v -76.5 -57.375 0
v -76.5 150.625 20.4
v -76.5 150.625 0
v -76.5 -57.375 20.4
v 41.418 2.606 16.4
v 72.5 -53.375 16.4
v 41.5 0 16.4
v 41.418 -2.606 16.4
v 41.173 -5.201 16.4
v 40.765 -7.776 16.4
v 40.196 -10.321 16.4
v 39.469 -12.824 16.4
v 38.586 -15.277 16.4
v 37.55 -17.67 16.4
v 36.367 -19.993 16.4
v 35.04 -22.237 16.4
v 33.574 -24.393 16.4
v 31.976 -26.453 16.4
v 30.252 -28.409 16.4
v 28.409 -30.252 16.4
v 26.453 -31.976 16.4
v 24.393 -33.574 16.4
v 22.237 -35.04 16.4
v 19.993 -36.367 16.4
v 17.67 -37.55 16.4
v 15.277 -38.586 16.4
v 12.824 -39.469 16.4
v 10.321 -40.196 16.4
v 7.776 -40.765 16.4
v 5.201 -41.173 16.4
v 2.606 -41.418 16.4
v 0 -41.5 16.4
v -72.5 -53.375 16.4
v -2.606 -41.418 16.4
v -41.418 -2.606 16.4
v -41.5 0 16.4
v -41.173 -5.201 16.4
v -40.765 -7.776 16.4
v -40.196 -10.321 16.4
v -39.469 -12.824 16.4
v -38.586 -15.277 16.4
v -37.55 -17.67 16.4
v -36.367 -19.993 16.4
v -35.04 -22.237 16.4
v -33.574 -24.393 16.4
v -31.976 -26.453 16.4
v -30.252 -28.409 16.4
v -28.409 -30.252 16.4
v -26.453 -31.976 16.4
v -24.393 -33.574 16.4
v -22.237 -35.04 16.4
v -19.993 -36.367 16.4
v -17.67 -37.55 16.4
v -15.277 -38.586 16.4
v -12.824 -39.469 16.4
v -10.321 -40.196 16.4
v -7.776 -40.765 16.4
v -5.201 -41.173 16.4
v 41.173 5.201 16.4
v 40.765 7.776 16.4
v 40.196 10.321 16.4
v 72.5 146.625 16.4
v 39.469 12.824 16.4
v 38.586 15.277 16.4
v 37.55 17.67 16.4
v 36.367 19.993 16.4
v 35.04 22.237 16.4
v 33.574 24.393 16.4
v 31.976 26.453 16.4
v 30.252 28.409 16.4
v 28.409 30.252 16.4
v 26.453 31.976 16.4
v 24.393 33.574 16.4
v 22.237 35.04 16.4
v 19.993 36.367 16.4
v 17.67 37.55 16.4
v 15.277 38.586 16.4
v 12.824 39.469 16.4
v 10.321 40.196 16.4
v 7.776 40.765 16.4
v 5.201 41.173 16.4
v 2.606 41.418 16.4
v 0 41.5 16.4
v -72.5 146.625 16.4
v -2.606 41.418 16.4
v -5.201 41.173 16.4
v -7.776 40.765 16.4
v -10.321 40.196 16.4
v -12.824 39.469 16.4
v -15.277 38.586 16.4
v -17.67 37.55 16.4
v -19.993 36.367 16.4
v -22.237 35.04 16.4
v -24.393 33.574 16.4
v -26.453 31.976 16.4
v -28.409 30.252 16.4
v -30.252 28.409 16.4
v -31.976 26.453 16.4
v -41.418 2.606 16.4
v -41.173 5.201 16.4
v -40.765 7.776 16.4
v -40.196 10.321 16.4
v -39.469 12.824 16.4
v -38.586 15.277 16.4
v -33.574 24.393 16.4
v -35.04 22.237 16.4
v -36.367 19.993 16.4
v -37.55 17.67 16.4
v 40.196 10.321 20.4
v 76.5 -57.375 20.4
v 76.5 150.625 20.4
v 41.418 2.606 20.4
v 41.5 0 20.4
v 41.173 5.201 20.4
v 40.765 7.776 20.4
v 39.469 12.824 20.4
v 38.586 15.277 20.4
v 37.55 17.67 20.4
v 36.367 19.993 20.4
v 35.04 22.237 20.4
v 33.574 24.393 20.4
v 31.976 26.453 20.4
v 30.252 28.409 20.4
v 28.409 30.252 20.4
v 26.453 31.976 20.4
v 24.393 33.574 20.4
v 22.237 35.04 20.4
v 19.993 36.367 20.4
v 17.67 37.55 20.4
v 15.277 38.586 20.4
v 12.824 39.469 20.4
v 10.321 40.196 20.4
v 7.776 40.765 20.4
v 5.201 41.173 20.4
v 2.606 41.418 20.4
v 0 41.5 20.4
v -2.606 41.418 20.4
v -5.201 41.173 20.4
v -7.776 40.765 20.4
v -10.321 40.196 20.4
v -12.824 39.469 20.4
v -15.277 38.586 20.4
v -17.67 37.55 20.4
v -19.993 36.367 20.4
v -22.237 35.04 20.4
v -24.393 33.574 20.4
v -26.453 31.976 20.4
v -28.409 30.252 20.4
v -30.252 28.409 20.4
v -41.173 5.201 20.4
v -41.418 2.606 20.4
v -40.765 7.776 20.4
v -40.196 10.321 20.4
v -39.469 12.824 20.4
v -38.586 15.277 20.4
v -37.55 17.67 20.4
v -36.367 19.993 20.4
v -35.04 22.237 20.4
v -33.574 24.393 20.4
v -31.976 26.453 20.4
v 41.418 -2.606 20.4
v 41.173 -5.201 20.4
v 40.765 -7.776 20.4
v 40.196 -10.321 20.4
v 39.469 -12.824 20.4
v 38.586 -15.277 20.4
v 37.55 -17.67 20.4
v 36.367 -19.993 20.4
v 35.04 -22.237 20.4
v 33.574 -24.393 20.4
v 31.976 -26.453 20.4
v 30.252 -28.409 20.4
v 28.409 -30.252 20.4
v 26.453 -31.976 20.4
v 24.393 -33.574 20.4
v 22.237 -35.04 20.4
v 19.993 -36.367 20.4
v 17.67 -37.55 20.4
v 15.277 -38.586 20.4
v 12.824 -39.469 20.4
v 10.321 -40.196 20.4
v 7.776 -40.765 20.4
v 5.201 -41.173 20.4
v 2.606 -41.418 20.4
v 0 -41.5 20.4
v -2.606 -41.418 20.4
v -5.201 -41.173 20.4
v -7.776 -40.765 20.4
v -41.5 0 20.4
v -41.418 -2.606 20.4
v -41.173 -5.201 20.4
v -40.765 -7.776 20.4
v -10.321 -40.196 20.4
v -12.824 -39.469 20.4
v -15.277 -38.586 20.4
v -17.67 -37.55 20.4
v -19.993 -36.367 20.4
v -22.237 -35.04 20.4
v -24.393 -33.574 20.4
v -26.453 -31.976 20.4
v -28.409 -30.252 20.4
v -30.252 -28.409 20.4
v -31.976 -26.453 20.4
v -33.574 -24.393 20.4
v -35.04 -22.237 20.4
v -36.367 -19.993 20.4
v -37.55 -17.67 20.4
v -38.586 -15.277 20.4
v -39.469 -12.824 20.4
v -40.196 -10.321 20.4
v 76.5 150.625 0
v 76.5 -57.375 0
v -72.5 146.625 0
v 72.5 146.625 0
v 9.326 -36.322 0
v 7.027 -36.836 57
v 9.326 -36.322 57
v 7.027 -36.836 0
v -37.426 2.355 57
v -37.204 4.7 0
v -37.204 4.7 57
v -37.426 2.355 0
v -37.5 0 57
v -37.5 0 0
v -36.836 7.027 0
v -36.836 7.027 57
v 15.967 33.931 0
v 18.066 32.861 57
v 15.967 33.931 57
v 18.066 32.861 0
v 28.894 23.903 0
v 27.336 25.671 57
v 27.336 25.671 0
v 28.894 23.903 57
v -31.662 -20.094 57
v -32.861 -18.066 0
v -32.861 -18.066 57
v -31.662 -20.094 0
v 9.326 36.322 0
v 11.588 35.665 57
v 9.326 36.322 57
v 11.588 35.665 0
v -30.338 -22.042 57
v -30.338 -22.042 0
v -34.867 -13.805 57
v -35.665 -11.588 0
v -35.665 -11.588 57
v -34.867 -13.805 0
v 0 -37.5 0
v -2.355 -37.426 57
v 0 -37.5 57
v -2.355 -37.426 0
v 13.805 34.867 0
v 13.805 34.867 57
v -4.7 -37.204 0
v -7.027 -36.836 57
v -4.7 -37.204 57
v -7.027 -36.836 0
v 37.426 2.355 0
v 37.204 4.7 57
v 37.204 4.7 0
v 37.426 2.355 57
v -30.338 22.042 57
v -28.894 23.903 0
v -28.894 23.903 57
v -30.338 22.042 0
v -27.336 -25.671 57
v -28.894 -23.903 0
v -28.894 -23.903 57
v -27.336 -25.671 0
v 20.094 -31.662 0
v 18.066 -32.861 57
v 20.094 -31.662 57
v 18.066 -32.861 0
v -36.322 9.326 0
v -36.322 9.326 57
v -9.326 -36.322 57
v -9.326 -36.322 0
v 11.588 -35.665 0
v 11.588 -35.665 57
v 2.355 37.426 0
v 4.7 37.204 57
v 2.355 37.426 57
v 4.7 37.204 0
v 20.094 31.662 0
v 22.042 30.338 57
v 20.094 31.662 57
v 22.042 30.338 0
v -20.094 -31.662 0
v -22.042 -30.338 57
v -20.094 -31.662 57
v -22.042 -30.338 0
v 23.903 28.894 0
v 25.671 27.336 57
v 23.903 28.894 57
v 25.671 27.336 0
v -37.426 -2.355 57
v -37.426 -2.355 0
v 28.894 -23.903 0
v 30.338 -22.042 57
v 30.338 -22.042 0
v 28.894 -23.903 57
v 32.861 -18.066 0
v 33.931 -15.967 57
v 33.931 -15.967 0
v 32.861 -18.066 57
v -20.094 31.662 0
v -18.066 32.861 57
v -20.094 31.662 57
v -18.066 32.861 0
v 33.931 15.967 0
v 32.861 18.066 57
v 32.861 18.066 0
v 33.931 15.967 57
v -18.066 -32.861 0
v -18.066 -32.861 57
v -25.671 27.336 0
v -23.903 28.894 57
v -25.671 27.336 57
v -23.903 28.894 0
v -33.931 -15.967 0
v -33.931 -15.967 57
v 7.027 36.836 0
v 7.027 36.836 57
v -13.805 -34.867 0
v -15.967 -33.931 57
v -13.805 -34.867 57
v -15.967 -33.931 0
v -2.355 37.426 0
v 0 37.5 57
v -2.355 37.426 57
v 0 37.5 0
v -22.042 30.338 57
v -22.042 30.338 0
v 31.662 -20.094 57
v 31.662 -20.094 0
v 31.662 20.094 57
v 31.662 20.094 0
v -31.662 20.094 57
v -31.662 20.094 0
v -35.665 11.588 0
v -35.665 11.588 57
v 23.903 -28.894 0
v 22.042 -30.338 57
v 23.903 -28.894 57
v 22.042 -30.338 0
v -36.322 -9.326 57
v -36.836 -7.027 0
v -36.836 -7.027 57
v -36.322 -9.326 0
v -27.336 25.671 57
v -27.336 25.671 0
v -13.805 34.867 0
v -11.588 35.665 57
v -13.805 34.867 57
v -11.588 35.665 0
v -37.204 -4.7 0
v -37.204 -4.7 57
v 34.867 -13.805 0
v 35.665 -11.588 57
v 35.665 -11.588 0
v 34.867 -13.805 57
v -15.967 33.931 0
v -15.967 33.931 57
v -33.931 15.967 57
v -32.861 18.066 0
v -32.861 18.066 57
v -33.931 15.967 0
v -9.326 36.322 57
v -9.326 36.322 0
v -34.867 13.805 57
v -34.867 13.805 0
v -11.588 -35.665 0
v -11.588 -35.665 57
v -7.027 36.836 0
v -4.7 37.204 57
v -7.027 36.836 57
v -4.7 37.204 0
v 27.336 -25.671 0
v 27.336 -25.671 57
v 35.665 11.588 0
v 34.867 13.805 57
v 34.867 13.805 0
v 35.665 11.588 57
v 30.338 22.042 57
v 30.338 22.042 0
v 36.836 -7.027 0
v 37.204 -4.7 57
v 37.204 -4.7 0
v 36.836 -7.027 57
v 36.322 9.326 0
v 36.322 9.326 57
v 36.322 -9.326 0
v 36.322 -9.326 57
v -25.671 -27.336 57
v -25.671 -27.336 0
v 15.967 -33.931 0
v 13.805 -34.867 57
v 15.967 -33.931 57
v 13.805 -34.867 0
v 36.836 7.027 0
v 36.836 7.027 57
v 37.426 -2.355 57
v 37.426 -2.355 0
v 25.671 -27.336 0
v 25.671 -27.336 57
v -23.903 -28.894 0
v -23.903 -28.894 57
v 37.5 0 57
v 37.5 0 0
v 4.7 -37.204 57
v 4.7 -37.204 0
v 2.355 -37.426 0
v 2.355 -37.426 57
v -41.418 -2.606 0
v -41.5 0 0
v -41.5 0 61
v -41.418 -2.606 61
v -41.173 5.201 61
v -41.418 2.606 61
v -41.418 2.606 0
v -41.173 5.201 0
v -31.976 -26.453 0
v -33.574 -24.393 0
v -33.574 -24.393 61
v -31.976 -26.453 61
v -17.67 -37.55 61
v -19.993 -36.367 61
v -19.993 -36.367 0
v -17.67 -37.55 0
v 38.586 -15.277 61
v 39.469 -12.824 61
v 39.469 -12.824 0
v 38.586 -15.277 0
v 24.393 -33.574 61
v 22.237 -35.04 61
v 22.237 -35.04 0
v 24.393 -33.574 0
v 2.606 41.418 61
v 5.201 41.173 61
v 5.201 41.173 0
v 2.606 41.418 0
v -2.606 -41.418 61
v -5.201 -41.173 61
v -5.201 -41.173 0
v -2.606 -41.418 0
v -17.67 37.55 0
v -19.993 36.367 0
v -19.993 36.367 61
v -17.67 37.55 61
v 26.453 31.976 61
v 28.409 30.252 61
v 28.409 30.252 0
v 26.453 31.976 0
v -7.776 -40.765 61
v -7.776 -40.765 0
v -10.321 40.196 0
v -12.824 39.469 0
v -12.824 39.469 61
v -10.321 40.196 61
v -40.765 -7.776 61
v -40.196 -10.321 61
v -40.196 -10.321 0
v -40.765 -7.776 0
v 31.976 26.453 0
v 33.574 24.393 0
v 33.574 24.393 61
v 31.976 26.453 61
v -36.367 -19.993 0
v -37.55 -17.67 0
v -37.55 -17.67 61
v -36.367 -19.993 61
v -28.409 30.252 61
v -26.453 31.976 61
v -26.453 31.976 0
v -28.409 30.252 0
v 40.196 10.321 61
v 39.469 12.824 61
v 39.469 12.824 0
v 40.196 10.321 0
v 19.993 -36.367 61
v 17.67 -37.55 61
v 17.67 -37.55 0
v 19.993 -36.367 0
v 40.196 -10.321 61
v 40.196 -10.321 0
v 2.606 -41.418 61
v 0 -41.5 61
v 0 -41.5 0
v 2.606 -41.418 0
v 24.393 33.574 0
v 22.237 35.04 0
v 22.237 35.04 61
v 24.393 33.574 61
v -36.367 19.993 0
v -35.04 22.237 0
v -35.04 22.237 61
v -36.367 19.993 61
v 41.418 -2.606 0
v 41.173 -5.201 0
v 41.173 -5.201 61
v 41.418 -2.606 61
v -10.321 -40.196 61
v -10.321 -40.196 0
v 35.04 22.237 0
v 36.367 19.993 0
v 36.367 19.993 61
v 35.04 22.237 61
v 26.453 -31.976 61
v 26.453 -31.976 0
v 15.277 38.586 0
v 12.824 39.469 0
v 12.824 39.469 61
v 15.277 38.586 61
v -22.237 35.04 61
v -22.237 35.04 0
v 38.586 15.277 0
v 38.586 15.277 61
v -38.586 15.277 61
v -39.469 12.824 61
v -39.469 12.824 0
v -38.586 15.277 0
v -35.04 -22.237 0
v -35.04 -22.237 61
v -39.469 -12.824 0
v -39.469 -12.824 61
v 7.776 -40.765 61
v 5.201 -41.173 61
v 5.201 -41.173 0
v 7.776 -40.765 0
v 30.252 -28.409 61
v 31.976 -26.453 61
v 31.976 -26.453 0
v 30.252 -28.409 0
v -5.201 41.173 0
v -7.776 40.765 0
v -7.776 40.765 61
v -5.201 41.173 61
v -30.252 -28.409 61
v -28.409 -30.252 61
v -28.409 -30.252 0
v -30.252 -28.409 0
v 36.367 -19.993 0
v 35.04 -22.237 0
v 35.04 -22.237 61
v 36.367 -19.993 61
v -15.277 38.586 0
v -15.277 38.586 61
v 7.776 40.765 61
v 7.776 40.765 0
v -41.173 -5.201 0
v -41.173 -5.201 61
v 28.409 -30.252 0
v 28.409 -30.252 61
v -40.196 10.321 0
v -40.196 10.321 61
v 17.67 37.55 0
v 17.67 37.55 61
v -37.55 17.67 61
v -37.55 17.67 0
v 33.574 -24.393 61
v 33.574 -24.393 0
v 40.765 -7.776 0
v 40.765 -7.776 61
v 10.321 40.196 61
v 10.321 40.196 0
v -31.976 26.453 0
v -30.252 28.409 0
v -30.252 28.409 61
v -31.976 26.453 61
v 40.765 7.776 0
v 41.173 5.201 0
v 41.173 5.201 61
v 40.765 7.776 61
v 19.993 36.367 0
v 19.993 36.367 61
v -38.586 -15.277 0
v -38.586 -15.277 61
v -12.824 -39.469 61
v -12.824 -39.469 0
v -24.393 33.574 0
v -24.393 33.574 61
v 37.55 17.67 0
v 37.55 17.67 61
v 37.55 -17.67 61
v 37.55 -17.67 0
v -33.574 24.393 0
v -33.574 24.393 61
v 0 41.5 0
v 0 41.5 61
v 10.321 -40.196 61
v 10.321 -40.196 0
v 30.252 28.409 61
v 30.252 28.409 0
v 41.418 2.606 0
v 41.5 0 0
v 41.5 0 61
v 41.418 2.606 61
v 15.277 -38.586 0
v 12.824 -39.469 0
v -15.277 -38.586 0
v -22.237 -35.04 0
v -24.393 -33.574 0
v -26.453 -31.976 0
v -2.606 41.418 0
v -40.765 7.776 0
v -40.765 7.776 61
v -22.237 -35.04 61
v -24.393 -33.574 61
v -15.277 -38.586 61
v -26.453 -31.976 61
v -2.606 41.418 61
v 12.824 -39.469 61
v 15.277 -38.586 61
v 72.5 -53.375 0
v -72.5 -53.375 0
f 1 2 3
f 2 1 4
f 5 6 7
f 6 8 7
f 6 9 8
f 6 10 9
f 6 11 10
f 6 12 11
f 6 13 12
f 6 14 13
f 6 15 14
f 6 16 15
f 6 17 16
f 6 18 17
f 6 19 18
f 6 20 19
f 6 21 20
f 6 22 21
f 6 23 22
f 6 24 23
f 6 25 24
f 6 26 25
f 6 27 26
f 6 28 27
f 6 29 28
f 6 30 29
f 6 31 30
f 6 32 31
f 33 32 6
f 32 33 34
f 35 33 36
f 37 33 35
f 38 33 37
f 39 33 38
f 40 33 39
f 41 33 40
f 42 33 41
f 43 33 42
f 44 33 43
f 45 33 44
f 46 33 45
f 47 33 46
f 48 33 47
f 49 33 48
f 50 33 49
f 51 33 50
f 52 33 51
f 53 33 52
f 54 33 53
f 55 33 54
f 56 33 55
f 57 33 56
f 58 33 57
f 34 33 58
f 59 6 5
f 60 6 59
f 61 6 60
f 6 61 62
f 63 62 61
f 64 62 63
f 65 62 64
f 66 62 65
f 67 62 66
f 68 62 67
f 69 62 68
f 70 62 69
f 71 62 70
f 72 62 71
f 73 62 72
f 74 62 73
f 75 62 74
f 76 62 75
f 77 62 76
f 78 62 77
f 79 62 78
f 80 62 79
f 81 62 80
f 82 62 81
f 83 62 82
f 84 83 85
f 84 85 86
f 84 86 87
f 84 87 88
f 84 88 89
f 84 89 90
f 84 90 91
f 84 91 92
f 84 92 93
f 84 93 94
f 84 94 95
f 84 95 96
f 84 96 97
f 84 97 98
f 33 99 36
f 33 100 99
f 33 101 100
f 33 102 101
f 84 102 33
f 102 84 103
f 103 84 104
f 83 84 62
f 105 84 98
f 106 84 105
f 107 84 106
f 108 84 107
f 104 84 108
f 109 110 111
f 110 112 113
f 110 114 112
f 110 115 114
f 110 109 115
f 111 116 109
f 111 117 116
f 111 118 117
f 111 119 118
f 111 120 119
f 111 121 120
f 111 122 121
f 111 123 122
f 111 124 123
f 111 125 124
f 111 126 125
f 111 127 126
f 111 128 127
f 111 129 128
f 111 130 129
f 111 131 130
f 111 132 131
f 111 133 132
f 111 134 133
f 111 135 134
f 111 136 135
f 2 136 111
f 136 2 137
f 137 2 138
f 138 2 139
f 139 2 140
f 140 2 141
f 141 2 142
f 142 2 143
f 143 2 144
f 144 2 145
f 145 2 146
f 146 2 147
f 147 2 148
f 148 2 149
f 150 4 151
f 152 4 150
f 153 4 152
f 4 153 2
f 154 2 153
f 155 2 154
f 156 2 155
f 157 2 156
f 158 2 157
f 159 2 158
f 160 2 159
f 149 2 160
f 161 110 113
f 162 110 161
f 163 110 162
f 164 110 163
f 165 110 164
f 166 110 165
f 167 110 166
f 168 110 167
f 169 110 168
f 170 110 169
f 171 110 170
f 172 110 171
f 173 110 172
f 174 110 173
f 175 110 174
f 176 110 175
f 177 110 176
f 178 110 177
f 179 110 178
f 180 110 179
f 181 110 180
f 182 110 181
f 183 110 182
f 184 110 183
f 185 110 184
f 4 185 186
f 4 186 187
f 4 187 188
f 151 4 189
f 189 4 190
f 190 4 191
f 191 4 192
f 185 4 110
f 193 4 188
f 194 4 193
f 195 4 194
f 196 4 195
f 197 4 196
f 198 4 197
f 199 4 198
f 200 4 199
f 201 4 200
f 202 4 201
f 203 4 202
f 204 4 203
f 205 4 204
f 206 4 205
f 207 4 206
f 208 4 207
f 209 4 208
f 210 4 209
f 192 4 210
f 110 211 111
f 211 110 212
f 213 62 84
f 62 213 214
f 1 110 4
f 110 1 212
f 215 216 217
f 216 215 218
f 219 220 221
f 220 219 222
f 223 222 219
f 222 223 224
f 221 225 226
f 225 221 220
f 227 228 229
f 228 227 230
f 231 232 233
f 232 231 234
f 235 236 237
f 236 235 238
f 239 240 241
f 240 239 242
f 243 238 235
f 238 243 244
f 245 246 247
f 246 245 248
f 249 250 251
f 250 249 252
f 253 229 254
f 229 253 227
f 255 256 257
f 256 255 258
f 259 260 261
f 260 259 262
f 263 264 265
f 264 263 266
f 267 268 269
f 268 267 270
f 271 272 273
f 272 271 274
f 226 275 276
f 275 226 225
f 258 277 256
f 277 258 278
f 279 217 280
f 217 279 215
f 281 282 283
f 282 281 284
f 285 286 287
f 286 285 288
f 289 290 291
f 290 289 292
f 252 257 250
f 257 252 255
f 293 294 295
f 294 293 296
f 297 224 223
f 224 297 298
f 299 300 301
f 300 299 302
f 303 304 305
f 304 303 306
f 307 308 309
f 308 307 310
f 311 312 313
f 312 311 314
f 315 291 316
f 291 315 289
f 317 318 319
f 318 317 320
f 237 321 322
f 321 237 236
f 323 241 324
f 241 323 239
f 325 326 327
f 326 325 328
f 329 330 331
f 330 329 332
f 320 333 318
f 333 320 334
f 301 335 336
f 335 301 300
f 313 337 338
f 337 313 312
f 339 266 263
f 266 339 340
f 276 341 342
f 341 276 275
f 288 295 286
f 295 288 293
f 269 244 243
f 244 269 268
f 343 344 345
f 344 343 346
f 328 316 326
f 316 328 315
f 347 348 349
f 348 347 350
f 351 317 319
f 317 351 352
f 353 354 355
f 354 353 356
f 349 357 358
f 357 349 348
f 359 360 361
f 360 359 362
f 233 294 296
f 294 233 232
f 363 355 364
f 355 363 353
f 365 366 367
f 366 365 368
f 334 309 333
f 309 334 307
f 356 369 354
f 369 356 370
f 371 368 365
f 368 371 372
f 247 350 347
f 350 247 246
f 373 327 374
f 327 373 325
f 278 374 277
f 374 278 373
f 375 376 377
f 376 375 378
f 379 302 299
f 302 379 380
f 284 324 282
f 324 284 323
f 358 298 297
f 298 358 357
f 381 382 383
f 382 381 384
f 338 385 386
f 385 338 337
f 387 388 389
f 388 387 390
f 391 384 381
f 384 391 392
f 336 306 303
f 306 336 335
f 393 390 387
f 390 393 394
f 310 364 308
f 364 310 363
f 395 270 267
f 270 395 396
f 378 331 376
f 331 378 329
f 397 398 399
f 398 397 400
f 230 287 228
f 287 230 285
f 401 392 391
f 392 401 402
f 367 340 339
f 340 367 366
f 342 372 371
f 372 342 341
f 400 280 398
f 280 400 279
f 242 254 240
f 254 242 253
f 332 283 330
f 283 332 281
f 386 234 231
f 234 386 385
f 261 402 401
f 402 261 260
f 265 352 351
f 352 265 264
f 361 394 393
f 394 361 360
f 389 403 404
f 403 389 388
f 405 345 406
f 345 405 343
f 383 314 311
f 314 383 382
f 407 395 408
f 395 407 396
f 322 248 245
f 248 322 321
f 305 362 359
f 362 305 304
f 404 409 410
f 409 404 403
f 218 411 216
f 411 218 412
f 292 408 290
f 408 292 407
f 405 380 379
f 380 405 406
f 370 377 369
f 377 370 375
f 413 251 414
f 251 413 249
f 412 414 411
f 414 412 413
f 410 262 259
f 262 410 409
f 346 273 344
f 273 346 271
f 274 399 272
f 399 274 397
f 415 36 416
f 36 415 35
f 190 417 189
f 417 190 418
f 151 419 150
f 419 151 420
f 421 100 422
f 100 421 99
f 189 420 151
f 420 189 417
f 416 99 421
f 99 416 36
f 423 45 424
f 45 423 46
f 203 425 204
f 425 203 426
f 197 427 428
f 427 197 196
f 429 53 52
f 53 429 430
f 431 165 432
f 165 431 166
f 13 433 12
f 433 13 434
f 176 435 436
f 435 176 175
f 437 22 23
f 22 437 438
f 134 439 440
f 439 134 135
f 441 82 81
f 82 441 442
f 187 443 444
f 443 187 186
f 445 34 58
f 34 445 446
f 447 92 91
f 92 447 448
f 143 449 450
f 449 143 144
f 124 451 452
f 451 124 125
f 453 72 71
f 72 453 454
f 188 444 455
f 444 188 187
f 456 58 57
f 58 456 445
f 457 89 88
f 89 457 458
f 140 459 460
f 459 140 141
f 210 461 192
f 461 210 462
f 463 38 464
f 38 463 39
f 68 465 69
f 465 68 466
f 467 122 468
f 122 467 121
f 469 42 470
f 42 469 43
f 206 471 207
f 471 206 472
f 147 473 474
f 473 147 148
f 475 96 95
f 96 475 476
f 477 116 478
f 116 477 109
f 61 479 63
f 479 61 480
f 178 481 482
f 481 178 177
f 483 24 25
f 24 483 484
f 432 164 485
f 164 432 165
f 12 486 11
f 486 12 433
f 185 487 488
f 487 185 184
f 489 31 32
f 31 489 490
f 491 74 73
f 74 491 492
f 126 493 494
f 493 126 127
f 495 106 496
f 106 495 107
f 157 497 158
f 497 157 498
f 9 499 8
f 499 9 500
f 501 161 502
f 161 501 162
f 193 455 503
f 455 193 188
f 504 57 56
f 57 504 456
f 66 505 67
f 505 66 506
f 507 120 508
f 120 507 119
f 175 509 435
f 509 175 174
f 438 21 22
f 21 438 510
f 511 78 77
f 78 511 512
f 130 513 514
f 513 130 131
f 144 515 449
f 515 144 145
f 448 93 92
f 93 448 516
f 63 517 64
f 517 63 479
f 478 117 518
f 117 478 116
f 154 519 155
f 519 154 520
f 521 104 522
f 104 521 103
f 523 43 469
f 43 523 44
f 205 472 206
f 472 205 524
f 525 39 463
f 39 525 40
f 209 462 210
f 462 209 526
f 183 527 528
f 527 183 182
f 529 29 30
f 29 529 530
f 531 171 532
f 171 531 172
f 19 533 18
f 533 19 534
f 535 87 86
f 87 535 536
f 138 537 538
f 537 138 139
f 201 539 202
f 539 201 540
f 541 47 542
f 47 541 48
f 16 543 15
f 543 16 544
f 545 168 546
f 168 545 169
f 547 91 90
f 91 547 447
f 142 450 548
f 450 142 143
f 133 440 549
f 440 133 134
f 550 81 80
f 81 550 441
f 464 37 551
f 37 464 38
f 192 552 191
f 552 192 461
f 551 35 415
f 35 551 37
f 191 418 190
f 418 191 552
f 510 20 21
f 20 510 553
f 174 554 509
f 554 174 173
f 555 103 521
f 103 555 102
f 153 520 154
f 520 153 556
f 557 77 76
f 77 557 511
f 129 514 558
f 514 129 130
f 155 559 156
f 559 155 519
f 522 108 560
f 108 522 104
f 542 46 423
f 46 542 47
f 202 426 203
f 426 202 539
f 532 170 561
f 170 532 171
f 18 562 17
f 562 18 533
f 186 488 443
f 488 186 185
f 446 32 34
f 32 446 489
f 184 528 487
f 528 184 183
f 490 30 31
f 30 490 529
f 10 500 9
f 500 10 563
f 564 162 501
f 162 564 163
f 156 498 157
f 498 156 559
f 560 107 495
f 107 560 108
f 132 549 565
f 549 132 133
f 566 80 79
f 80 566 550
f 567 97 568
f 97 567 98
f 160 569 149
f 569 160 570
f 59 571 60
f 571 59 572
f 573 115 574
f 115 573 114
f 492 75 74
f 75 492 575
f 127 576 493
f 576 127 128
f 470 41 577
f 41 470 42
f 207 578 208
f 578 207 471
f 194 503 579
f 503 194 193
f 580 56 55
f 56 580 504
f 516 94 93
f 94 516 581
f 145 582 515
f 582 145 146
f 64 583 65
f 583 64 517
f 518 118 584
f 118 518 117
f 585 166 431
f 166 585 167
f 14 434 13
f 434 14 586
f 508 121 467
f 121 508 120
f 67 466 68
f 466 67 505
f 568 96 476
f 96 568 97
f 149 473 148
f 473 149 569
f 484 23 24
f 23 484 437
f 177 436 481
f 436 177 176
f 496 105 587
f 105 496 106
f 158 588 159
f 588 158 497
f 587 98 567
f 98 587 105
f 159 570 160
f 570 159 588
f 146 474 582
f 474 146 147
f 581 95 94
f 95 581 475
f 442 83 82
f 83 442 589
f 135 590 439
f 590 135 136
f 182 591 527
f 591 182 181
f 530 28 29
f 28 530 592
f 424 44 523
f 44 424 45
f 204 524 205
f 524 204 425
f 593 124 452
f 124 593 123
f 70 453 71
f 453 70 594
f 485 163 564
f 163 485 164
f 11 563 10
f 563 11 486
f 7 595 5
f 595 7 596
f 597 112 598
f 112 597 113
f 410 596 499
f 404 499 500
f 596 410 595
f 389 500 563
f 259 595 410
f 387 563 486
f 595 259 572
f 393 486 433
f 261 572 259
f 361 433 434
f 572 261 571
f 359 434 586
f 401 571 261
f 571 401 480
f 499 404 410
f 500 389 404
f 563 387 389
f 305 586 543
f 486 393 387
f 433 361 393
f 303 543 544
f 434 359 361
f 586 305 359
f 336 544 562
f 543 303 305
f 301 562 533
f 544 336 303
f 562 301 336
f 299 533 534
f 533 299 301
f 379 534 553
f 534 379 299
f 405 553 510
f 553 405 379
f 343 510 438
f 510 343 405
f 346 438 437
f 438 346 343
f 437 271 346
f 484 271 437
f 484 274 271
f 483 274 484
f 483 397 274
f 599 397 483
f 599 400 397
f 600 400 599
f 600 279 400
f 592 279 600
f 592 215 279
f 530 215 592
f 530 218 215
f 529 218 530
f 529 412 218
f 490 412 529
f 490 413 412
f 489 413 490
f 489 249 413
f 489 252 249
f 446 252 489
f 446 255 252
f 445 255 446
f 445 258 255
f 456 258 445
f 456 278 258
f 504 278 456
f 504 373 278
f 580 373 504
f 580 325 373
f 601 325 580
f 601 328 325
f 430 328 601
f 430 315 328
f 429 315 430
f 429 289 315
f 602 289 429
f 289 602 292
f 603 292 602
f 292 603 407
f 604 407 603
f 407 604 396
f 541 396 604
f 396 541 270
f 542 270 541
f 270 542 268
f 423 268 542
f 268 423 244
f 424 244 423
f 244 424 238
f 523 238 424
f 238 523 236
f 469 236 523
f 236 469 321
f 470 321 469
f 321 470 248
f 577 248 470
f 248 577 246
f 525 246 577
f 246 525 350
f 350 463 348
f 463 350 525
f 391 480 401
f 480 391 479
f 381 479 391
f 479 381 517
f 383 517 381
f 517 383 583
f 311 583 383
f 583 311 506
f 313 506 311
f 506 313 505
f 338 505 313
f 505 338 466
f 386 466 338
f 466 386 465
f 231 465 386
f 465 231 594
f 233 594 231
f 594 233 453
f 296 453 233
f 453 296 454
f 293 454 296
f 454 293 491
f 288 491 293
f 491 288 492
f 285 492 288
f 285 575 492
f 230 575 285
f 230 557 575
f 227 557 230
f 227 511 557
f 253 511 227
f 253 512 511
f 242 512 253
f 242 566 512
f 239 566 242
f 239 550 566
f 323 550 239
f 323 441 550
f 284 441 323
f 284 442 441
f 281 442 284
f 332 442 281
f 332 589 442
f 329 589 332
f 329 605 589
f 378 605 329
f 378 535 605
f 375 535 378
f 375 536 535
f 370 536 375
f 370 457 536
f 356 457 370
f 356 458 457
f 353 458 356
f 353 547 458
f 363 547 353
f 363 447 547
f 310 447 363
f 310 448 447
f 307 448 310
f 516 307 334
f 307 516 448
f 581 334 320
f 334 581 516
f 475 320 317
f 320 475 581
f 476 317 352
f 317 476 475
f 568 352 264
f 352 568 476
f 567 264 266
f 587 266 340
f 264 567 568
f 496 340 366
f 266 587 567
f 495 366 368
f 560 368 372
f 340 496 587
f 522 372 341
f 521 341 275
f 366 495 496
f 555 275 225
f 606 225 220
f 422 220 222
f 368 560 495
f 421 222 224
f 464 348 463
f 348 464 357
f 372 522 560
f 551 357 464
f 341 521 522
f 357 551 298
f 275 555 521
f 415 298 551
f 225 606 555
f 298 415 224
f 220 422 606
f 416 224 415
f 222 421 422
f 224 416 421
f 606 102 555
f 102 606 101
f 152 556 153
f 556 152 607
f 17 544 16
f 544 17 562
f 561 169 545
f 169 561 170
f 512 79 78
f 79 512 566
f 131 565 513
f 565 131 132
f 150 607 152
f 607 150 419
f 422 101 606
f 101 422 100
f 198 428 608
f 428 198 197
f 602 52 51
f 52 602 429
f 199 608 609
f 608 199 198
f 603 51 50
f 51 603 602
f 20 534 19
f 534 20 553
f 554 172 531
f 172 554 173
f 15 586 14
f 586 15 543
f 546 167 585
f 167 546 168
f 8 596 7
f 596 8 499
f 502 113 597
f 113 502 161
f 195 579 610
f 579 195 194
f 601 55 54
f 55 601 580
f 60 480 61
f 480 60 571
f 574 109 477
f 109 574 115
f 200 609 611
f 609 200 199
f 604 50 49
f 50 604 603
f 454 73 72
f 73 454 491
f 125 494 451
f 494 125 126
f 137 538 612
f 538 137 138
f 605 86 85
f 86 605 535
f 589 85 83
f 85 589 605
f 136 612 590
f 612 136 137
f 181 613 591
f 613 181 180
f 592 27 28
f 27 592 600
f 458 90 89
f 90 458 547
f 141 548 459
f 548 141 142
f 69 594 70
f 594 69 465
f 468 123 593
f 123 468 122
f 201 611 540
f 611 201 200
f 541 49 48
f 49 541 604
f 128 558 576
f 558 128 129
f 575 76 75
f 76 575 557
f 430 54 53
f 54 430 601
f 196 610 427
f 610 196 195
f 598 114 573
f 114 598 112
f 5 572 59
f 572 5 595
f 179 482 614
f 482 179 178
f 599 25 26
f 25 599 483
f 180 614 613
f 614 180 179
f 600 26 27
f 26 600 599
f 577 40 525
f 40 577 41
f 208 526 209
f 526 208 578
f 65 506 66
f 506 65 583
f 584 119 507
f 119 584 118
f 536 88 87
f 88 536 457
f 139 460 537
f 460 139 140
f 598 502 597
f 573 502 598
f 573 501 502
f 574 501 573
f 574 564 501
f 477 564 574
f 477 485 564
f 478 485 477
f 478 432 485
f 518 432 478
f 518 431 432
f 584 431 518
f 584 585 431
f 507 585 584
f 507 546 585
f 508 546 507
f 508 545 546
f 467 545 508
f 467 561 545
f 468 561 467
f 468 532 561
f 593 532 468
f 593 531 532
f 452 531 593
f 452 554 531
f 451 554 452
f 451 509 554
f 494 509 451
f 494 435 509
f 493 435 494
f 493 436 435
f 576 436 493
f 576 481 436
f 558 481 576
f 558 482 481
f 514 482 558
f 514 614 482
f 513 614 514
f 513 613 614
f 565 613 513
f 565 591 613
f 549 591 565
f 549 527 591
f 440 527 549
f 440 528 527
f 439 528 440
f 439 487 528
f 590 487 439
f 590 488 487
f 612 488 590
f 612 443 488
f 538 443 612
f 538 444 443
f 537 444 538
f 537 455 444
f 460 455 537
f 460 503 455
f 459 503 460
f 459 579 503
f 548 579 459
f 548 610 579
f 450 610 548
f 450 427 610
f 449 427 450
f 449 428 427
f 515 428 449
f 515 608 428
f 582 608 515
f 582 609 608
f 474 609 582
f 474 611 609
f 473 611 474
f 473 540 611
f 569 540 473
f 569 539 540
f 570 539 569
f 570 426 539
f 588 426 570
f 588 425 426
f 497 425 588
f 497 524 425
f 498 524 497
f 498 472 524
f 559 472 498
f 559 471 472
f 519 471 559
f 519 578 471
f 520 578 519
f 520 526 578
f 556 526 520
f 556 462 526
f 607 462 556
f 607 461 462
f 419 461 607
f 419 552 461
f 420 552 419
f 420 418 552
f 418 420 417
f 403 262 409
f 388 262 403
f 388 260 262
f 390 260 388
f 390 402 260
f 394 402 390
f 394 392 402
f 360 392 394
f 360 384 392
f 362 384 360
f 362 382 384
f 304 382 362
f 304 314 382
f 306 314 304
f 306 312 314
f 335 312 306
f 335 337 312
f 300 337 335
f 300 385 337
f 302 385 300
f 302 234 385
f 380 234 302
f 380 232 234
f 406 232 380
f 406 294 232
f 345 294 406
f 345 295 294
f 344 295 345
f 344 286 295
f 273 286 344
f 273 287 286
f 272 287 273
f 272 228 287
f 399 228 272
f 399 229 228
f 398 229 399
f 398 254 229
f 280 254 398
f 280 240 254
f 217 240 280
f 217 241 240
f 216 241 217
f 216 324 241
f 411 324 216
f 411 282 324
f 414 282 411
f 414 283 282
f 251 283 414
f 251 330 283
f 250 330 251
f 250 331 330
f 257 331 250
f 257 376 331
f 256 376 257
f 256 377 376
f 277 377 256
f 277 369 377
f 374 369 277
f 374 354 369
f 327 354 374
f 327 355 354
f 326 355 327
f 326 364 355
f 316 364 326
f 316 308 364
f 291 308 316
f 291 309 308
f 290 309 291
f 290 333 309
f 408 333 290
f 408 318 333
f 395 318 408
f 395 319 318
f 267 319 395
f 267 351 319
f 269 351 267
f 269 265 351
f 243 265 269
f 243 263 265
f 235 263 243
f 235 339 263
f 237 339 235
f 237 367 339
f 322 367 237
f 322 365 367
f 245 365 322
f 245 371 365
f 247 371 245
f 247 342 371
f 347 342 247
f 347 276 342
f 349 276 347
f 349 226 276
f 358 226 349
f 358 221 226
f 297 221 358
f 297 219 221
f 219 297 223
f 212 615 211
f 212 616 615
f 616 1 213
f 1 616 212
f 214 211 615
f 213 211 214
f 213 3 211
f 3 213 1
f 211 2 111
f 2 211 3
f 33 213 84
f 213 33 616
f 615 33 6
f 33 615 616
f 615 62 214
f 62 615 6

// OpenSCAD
$fn = 100;

can_d = 65;
can_h = 122;

inch = 25.5;

tray_h = 8 * inch;
tray_w = 6 * inch;
tray_d = 4;

wall_height = 0.8 * inch; 
y_offset = -2.25 * inch;


holder_id = 75;
holder_od = holder_id + (tray_d * 2);
holder_h  = can_h / 2; // TODO: Worse case


module cupholder() {
  // /////////////////////////////////////////////////////////////////////////////
  // Can
  // translate([0, 0, tray_d])
  // %cylinder(d=can_d, h=can_h);
  
  // /////////////////////////////////////////////////////////////////////////////
  // Tray
  difference() {
    color("red")
    translate([-(tray_w/2), y_offset, 0])
    cube([tray_w, tray_h, tray_d]);
    
    translate([0, 0, -1])
    cylinder(d=holder_id, h=tray_d+2);
  }
  
  // /////////////////////////////////////////////////////////////////////////////
  // Walls
  
  // North Wall
  translate([-(tray_w/2), tray_h+y_offset, 0])
  cube([tray_w, tray_d, wall_height]);
  
  // East Wall
  translate([(tray_w/2)-tray_d, y_offset+tray_d, 0])
  cube([tray_d, tray_h, wall_height]);
  
  // South Wall
  translate([-tray_w/2, y_offset, 0])
  cube([tray_w, tray_d, wall_height]);
  
  // West Wall
  translate([-tray_w/2, y_offset, 0])
  cube([tray_d, tray_h, wall_height]);
  
  // /////////////////////////////////////////////////////////////////////////////
  // Holder
  difference() {
    inset = wall_height;
  
    color("blue")
    translate([0, 0, -holder_h+inset])
    cylinder(d=holder_od, h=holder_h);
  
    translate([0, 0, -holder_h+tray_d+inset])
    cylinder(d=holder_id, h=holder_h);
  }
}

translate([0, 0, wall_height])
rotate([0, 180, 0])
cupholder();
